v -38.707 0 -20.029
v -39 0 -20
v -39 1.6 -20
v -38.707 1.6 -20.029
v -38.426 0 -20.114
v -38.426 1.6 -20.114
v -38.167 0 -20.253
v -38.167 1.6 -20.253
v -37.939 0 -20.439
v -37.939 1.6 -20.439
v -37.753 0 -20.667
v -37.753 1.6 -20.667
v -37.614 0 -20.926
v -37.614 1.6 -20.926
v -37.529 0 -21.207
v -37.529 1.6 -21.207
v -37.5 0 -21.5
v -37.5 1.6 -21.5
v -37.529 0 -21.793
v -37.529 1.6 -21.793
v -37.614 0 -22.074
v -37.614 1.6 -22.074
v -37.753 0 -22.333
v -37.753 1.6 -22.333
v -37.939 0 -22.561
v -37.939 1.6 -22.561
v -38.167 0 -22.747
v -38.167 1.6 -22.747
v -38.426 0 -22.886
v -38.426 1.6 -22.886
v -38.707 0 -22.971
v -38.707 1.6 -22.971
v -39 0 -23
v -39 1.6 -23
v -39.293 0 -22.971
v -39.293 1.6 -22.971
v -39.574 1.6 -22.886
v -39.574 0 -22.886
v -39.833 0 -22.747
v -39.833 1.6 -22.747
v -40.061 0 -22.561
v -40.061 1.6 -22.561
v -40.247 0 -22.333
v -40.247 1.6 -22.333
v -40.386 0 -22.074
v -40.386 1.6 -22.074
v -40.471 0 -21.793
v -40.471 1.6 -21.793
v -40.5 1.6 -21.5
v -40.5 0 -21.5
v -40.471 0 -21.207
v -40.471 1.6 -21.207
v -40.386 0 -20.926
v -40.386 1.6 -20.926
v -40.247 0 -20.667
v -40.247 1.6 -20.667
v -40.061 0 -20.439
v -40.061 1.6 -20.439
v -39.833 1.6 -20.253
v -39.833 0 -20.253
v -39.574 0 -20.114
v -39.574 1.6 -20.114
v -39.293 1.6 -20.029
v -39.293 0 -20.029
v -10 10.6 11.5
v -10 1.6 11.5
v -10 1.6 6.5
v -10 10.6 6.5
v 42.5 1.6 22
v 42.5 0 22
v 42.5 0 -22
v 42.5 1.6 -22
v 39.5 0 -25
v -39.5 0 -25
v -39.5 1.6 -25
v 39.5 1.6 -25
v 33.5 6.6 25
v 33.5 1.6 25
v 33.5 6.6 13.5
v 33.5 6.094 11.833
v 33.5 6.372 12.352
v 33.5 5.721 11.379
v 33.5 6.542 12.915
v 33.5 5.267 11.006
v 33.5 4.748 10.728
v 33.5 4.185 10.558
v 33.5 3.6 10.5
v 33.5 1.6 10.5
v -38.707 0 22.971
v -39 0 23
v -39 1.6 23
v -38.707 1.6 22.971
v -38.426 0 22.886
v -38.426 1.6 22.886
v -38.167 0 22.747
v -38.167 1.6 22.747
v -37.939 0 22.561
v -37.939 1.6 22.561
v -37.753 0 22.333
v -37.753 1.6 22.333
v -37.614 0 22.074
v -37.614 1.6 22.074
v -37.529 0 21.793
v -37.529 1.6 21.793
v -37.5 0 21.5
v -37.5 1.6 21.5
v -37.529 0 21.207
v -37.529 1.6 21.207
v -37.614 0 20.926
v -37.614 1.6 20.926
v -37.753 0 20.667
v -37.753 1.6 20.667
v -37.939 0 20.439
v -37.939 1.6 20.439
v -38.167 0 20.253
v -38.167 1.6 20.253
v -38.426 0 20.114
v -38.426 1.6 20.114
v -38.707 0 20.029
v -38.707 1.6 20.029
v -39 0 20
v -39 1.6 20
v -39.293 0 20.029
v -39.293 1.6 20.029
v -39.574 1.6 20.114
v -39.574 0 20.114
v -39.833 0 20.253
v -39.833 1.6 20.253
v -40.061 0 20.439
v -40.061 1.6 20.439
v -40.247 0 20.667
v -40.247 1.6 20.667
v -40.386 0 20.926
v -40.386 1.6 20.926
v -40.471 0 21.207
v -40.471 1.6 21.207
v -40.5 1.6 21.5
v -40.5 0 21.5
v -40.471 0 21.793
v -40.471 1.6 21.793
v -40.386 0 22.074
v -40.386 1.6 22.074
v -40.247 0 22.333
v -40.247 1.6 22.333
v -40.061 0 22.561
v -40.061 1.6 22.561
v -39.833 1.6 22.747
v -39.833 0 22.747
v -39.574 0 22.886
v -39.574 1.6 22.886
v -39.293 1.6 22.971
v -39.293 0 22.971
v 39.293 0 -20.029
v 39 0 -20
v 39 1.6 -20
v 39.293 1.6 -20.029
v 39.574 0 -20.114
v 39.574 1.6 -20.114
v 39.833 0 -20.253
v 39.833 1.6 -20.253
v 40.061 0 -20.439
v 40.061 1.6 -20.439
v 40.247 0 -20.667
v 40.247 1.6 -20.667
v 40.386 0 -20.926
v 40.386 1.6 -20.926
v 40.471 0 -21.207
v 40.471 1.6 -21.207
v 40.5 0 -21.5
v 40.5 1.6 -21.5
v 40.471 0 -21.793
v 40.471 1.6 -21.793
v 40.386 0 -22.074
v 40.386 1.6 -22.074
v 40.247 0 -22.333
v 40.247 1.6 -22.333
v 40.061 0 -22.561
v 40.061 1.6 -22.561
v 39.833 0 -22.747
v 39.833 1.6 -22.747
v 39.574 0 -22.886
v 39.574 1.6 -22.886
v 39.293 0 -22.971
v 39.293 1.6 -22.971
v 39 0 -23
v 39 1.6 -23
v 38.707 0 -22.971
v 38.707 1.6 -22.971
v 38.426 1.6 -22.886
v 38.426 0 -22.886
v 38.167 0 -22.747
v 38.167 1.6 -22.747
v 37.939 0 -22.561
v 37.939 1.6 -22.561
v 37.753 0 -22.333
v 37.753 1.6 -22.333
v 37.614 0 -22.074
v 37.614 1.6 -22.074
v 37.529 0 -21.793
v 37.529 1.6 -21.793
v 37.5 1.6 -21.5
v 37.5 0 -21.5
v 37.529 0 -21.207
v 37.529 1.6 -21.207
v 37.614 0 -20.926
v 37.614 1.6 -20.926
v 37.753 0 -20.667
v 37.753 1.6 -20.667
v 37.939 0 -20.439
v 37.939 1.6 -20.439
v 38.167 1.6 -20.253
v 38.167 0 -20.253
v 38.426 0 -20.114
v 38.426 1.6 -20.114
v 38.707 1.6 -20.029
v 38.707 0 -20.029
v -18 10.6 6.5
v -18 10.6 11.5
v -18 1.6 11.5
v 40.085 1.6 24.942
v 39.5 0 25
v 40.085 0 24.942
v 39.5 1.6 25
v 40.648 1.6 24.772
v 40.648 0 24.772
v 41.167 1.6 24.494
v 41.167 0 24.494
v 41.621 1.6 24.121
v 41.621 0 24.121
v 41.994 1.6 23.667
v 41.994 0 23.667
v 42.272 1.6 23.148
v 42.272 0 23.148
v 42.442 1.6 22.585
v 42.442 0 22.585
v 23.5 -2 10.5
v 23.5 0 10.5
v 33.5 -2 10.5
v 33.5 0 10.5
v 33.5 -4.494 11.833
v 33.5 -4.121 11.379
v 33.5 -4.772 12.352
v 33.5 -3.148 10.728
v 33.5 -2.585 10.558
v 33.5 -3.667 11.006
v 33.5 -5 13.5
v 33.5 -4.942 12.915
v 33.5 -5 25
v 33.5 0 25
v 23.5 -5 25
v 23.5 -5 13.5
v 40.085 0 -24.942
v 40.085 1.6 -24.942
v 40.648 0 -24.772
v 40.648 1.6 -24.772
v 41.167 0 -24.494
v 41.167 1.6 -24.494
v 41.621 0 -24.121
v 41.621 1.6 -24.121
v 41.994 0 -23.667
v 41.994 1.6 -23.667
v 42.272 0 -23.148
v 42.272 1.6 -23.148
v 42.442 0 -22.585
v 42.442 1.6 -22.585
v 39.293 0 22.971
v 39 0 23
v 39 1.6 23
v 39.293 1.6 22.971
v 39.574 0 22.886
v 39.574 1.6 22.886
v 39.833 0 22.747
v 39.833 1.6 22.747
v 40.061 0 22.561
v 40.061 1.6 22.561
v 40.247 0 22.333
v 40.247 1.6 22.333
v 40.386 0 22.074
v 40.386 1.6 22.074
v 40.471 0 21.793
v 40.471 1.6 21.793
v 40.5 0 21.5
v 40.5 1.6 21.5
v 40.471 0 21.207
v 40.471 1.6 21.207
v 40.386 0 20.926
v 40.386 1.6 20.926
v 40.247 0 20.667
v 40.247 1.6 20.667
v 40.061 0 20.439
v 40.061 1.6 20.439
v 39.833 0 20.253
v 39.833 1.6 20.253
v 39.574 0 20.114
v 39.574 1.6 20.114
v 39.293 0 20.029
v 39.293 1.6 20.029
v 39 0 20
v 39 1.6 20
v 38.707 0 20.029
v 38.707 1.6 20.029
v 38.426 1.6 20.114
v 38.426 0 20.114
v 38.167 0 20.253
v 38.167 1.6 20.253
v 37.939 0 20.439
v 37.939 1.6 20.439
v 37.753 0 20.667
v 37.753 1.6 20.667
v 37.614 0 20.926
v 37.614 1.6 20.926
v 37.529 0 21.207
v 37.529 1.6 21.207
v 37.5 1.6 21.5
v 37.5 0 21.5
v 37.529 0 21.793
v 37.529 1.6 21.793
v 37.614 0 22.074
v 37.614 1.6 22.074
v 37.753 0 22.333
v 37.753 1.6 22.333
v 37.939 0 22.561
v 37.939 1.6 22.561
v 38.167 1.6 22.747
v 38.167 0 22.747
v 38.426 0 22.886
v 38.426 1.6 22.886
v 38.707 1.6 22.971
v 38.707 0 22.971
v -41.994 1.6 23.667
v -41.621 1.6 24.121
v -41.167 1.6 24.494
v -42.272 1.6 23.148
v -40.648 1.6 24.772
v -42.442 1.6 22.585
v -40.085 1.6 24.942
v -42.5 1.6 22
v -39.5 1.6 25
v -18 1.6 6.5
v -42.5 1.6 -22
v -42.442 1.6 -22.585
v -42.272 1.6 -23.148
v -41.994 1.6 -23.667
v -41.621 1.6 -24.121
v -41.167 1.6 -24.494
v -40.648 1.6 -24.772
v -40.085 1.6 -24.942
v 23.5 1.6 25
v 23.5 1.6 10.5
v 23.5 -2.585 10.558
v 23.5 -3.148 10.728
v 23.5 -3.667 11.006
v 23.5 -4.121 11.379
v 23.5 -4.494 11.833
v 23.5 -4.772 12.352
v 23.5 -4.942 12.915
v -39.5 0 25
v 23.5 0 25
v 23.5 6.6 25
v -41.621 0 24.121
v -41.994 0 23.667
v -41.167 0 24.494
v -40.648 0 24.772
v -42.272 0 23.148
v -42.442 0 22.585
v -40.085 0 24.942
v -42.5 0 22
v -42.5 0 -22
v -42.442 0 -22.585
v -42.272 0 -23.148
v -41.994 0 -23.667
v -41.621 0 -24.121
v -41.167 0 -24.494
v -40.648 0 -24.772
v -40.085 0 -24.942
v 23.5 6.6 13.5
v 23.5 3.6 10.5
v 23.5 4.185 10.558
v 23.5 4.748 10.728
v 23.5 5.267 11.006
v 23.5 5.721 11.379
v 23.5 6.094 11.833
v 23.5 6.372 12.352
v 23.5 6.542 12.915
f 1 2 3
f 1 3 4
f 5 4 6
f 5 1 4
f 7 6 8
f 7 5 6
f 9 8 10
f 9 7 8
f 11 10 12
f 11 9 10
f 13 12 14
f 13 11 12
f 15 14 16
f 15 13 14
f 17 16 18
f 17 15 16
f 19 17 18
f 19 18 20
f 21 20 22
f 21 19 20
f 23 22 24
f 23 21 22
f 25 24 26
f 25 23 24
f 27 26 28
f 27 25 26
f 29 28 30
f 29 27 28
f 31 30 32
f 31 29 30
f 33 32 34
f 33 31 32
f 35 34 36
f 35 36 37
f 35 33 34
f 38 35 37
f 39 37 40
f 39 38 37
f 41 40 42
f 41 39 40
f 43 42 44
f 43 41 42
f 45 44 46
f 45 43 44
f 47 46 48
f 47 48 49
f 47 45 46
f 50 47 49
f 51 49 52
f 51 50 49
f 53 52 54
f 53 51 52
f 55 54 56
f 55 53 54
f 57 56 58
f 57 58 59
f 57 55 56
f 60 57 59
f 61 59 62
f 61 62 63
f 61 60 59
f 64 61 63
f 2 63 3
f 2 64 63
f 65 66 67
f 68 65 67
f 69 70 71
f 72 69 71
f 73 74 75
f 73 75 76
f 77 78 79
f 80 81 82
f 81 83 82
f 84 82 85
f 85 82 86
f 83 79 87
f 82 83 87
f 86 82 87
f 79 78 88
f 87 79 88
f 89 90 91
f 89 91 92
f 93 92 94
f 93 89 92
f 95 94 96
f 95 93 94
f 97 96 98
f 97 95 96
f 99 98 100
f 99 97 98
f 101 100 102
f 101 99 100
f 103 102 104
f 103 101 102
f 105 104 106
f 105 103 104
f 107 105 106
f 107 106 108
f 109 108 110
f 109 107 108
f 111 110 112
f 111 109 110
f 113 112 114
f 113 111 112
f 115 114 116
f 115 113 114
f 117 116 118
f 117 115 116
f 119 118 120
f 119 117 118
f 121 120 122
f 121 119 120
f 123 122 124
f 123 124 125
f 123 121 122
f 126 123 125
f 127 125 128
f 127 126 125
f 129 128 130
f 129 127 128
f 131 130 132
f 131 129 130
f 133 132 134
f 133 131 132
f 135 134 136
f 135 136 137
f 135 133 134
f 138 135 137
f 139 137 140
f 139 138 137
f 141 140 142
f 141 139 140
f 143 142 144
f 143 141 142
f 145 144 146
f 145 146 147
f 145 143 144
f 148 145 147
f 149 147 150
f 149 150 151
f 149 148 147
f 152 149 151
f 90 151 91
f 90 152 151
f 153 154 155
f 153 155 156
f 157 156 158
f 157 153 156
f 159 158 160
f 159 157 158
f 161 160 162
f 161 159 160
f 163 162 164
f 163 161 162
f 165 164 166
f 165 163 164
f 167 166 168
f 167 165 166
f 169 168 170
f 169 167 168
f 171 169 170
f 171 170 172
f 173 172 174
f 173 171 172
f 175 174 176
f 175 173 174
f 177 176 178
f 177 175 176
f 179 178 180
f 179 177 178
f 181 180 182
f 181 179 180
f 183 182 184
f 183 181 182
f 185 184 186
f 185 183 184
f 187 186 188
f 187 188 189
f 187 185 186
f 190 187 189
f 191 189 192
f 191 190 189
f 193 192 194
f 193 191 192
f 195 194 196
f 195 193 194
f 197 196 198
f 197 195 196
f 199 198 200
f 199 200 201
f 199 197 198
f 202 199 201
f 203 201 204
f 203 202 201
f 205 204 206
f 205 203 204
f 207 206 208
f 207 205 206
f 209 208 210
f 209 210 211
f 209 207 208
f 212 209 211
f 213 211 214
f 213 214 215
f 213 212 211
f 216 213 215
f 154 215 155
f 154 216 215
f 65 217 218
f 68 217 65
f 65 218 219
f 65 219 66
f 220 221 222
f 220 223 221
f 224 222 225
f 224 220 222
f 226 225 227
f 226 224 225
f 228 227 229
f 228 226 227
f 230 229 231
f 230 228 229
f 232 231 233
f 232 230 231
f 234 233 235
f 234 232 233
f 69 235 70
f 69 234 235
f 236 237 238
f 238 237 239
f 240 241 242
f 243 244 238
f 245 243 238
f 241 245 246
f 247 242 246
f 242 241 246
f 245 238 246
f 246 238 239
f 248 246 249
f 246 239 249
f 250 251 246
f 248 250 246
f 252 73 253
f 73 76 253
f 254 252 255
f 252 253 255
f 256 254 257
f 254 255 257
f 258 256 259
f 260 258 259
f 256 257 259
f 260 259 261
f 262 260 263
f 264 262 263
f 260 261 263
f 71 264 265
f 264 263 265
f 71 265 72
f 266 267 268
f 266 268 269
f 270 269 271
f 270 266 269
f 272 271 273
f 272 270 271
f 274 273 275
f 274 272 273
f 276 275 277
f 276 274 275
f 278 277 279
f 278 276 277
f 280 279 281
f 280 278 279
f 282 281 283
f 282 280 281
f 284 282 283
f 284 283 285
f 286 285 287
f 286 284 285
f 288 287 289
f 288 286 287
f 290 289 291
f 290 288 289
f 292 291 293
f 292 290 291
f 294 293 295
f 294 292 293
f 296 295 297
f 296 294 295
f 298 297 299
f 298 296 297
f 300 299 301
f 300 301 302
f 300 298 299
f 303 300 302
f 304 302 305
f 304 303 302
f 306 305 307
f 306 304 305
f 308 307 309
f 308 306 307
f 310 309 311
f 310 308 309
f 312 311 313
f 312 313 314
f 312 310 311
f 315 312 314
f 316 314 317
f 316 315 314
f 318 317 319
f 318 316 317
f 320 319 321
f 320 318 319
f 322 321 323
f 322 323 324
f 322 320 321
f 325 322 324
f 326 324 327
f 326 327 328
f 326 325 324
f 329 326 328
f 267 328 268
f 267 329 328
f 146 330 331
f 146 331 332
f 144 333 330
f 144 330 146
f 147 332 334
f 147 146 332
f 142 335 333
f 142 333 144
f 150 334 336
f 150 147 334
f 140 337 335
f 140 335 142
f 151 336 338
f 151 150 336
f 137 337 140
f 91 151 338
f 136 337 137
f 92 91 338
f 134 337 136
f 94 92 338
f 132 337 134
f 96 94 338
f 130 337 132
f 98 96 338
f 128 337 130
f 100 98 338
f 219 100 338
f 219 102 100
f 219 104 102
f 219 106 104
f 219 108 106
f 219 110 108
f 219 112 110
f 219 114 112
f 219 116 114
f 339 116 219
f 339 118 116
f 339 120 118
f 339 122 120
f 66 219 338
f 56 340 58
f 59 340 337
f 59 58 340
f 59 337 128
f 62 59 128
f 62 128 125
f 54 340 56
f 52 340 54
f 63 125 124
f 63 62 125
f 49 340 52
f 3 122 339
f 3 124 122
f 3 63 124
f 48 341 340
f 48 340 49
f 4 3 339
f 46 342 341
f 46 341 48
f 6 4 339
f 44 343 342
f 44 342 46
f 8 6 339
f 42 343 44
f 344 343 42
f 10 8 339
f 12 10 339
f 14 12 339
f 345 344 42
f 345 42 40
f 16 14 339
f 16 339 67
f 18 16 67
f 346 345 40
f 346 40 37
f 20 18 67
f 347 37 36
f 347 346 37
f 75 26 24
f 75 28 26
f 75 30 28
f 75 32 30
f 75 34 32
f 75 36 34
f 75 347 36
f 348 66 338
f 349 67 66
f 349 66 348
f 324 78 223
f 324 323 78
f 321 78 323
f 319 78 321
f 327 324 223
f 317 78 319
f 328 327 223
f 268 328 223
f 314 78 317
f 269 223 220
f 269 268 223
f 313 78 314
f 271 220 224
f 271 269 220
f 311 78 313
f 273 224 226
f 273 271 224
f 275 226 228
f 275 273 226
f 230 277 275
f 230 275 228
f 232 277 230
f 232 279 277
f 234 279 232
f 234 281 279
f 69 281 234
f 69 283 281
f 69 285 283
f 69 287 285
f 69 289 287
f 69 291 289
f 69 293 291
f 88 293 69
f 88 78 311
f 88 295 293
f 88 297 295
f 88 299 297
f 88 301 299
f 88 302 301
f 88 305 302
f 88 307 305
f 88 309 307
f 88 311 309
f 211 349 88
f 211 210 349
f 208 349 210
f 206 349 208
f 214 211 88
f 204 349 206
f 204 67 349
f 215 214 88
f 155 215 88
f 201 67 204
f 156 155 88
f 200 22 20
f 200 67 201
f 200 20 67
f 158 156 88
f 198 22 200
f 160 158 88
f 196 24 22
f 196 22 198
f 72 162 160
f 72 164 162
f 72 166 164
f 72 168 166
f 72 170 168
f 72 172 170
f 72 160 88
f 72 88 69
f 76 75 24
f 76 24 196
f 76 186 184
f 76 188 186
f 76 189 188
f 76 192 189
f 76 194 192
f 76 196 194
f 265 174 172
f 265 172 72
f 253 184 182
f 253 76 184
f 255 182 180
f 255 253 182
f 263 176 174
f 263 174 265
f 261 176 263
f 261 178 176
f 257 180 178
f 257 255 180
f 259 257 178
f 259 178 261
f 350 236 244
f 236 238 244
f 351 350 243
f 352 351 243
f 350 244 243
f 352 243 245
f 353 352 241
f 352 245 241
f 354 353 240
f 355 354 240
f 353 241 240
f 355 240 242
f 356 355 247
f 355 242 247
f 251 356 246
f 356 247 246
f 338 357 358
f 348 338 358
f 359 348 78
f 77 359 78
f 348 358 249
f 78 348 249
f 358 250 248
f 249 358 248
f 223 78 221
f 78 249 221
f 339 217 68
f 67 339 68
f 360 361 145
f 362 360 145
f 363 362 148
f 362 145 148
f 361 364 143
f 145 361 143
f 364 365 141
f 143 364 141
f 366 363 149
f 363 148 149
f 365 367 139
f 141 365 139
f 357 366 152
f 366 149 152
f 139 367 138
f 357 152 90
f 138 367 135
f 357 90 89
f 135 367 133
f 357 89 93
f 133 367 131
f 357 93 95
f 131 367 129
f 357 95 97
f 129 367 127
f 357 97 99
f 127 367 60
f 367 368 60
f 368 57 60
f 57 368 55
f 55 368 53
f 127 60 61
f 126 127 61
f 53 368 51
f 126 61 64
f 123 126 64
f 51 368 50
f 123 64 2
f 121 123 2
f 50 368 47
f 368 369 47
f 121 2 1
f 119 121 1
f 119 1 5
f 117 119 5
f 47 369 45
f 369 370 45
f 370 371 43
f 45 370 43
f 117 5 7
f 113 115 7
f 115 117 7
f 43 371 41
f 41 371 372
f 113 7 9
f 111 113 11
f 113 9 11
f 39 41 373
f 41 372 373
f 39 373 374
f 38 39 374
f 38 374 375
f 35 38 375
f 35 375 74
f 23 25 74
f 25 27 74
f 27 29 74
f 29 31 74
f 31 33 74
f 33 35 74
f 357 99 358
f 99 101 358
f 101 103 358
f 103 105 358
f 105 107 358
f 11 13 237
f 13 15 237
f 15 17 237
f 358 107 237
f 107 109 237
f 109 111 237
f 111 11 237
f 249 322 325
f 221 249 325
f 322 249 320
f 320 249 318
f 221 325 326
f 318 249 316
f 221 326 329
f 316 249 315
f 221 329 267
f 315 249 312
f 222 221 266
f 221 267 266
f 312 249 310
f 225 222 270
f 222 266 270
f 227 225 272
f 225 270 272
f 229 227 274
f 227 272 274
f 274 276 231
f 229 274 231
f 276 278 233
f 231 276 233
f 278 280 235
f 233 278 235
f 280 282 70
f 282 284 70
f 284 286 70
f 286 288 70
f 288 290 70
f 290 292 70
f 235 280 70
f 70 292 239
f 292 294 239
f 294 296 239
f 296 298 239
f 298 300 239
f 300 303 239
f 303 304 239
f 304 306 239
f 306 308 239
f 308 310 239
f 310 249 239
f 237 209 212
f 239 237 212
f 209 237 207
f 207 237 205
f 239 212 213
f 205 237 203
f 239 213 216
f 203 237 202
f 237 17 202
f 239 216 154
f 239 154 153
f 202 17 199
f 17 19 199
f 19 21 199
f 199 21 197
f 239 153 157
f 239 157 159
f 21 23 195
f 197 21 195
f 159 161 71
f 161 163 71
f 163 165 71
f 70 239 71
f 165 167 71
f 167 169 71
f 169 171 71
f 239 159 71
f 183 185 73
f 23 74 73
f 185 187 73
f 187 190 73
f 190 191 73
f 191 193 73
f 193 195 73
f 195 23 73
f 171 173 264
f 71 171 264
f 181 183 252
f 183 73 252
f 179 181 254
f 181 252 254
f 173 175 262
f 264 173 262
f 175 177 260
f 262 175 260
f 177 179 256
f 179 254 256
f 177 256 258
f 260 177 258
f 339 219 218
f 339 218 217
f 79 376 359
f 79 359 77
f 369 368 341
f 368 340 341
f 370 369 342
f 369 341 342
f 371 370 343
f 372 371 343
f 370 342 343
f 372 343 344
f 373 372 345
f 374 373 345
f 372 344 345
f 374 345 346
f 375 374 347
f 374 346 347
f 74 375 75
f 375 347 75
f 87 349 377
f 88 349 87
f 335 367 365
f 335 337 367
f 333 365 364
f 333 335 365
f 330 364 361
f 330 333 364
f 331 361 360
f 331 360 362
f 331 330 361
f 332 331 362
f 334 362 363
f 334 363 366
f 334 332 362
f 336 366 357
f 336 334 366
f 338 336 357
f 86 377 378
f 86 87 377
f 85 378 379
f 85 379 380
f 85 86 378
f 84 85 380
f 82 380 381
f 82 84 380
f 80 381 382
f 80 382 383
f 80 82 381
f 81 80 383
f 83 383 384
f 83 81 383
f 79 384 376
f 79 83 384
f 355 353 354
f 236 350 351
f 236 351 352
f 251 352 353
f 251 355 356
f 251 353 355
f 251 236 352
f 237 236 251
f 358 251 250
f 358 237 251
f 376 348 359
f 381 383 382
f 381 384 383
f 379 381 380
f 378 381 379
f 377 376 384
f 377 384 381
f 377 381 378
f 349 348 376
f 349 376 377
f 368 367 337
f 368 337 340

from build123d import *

# Parameters (mm, degrees)
SKETCH_1_W      = 85
SKETCH_1_H      = 50
SKETCH_1_R      = 1.5
EXTRUDE_1_DEPTH = 1.6
FILLET_1_R      = 3
SKETCH_2_W      = 10
SKETCH_2_H      = 14.5
EXTRUDE_2_DEPTH = 5
SKETCH_3_W      = 8
SKETCH_3_H      = 5
EXTRUDE_3_DEPTH = 9
SKETCH_4_W      = 10
SKETCH_4_H      = 14.5
EXTRUDE_4_DEPTH = 5
FILLET_2_R      = 3


with BuildPart() as part:
    # 草图1 → 凸台-拉伸1 (new body)
    with BuildSketch(Plane(origin=(0, 0, 0), x_dir=(1, 0, 0), z_dir=(0, 1, 0))):
        Rectangle(SKETCH_1_W, SKETCH_1_H)
        with Locations(Location((-39, 21.5, 0), (0, 0, 270))):
            Circle(SKETCH_1_R, mode=Mode.SUBTRACT)
        with Locations(Location((39, 21.5, 0), (0, 0, 270))):
            Circle(SKETCH_1_R, mode=Mode.SUBTRACT)
        with Locations(Location((39, -21.5, 0), (0, 0, 270))):
            Circle(SKETCH_1_R, mode=Mode.SUBTRACT)
        with Locations(Location((-39, -21.5, 0), (0, 0, 270))):
            Circle(SKETCH_1_R, mode=Mode.SUBTRACT)
    extrude(amount=EXTRUDE_1_DEPTH)

    # 圆角1
    fillet_1_edges = [part.edges().sort_by_distance(p)[0] for p in [
        (42.5, 0.8, 25),
        (-42.5, 0.8, 25),
        (-42.5, 0.8, -25),
        (42.5, 0.8, -25),
    ]]
    fillet(fillet_1_edges, radius=FILLET_1_R)

    # 草图2 → 凸台-拉伸2 (add)
    with BuildSketch(Plane(origin=(0, 1.6, 0), x_dir=(1, 0, 0), z_dir=(0, 1, 0))):
        with Locations((28.5, -17.75)):
            Rectangle(SKETCH_2_W, SKETCH_2_H)
    extrude(amount=EXTRUDE_2_DEPTH)

    # 草图3 → 凸台-拉伸3 (add)
    with BuildSketch(Plane(origin=(0, 1.6, 0), x_dir=(1, 0, 0), z_dir=(0, 1, 0))):
        with Locations((-14, -9)):
            Rectangle(SKETCH_3_W, SKETCH_3_H)
    extrude(amount=EXTRUDE_3_DEPTH)

    # 草图4 → 凸台-拉伸4 (add)
    with BuildSketch(Plane.XZ):
        with Locations((28.5, 17.75)):
            Rectangle(SKETCH_4_W, SKETCH_4_H)
    extrude(amount=EXTRUDE_4_DEPTH)

    # 圆角2
    fillet_2_edges = [part.edges().sort_by_distance(p)[0] for p in [
        (28.5, 6.6, 10.5),
        (28.5, -5, 10.5),
    ]]
    fillet(fillet_2_edges, radius=FILLET_2_R)


solid = part.part
